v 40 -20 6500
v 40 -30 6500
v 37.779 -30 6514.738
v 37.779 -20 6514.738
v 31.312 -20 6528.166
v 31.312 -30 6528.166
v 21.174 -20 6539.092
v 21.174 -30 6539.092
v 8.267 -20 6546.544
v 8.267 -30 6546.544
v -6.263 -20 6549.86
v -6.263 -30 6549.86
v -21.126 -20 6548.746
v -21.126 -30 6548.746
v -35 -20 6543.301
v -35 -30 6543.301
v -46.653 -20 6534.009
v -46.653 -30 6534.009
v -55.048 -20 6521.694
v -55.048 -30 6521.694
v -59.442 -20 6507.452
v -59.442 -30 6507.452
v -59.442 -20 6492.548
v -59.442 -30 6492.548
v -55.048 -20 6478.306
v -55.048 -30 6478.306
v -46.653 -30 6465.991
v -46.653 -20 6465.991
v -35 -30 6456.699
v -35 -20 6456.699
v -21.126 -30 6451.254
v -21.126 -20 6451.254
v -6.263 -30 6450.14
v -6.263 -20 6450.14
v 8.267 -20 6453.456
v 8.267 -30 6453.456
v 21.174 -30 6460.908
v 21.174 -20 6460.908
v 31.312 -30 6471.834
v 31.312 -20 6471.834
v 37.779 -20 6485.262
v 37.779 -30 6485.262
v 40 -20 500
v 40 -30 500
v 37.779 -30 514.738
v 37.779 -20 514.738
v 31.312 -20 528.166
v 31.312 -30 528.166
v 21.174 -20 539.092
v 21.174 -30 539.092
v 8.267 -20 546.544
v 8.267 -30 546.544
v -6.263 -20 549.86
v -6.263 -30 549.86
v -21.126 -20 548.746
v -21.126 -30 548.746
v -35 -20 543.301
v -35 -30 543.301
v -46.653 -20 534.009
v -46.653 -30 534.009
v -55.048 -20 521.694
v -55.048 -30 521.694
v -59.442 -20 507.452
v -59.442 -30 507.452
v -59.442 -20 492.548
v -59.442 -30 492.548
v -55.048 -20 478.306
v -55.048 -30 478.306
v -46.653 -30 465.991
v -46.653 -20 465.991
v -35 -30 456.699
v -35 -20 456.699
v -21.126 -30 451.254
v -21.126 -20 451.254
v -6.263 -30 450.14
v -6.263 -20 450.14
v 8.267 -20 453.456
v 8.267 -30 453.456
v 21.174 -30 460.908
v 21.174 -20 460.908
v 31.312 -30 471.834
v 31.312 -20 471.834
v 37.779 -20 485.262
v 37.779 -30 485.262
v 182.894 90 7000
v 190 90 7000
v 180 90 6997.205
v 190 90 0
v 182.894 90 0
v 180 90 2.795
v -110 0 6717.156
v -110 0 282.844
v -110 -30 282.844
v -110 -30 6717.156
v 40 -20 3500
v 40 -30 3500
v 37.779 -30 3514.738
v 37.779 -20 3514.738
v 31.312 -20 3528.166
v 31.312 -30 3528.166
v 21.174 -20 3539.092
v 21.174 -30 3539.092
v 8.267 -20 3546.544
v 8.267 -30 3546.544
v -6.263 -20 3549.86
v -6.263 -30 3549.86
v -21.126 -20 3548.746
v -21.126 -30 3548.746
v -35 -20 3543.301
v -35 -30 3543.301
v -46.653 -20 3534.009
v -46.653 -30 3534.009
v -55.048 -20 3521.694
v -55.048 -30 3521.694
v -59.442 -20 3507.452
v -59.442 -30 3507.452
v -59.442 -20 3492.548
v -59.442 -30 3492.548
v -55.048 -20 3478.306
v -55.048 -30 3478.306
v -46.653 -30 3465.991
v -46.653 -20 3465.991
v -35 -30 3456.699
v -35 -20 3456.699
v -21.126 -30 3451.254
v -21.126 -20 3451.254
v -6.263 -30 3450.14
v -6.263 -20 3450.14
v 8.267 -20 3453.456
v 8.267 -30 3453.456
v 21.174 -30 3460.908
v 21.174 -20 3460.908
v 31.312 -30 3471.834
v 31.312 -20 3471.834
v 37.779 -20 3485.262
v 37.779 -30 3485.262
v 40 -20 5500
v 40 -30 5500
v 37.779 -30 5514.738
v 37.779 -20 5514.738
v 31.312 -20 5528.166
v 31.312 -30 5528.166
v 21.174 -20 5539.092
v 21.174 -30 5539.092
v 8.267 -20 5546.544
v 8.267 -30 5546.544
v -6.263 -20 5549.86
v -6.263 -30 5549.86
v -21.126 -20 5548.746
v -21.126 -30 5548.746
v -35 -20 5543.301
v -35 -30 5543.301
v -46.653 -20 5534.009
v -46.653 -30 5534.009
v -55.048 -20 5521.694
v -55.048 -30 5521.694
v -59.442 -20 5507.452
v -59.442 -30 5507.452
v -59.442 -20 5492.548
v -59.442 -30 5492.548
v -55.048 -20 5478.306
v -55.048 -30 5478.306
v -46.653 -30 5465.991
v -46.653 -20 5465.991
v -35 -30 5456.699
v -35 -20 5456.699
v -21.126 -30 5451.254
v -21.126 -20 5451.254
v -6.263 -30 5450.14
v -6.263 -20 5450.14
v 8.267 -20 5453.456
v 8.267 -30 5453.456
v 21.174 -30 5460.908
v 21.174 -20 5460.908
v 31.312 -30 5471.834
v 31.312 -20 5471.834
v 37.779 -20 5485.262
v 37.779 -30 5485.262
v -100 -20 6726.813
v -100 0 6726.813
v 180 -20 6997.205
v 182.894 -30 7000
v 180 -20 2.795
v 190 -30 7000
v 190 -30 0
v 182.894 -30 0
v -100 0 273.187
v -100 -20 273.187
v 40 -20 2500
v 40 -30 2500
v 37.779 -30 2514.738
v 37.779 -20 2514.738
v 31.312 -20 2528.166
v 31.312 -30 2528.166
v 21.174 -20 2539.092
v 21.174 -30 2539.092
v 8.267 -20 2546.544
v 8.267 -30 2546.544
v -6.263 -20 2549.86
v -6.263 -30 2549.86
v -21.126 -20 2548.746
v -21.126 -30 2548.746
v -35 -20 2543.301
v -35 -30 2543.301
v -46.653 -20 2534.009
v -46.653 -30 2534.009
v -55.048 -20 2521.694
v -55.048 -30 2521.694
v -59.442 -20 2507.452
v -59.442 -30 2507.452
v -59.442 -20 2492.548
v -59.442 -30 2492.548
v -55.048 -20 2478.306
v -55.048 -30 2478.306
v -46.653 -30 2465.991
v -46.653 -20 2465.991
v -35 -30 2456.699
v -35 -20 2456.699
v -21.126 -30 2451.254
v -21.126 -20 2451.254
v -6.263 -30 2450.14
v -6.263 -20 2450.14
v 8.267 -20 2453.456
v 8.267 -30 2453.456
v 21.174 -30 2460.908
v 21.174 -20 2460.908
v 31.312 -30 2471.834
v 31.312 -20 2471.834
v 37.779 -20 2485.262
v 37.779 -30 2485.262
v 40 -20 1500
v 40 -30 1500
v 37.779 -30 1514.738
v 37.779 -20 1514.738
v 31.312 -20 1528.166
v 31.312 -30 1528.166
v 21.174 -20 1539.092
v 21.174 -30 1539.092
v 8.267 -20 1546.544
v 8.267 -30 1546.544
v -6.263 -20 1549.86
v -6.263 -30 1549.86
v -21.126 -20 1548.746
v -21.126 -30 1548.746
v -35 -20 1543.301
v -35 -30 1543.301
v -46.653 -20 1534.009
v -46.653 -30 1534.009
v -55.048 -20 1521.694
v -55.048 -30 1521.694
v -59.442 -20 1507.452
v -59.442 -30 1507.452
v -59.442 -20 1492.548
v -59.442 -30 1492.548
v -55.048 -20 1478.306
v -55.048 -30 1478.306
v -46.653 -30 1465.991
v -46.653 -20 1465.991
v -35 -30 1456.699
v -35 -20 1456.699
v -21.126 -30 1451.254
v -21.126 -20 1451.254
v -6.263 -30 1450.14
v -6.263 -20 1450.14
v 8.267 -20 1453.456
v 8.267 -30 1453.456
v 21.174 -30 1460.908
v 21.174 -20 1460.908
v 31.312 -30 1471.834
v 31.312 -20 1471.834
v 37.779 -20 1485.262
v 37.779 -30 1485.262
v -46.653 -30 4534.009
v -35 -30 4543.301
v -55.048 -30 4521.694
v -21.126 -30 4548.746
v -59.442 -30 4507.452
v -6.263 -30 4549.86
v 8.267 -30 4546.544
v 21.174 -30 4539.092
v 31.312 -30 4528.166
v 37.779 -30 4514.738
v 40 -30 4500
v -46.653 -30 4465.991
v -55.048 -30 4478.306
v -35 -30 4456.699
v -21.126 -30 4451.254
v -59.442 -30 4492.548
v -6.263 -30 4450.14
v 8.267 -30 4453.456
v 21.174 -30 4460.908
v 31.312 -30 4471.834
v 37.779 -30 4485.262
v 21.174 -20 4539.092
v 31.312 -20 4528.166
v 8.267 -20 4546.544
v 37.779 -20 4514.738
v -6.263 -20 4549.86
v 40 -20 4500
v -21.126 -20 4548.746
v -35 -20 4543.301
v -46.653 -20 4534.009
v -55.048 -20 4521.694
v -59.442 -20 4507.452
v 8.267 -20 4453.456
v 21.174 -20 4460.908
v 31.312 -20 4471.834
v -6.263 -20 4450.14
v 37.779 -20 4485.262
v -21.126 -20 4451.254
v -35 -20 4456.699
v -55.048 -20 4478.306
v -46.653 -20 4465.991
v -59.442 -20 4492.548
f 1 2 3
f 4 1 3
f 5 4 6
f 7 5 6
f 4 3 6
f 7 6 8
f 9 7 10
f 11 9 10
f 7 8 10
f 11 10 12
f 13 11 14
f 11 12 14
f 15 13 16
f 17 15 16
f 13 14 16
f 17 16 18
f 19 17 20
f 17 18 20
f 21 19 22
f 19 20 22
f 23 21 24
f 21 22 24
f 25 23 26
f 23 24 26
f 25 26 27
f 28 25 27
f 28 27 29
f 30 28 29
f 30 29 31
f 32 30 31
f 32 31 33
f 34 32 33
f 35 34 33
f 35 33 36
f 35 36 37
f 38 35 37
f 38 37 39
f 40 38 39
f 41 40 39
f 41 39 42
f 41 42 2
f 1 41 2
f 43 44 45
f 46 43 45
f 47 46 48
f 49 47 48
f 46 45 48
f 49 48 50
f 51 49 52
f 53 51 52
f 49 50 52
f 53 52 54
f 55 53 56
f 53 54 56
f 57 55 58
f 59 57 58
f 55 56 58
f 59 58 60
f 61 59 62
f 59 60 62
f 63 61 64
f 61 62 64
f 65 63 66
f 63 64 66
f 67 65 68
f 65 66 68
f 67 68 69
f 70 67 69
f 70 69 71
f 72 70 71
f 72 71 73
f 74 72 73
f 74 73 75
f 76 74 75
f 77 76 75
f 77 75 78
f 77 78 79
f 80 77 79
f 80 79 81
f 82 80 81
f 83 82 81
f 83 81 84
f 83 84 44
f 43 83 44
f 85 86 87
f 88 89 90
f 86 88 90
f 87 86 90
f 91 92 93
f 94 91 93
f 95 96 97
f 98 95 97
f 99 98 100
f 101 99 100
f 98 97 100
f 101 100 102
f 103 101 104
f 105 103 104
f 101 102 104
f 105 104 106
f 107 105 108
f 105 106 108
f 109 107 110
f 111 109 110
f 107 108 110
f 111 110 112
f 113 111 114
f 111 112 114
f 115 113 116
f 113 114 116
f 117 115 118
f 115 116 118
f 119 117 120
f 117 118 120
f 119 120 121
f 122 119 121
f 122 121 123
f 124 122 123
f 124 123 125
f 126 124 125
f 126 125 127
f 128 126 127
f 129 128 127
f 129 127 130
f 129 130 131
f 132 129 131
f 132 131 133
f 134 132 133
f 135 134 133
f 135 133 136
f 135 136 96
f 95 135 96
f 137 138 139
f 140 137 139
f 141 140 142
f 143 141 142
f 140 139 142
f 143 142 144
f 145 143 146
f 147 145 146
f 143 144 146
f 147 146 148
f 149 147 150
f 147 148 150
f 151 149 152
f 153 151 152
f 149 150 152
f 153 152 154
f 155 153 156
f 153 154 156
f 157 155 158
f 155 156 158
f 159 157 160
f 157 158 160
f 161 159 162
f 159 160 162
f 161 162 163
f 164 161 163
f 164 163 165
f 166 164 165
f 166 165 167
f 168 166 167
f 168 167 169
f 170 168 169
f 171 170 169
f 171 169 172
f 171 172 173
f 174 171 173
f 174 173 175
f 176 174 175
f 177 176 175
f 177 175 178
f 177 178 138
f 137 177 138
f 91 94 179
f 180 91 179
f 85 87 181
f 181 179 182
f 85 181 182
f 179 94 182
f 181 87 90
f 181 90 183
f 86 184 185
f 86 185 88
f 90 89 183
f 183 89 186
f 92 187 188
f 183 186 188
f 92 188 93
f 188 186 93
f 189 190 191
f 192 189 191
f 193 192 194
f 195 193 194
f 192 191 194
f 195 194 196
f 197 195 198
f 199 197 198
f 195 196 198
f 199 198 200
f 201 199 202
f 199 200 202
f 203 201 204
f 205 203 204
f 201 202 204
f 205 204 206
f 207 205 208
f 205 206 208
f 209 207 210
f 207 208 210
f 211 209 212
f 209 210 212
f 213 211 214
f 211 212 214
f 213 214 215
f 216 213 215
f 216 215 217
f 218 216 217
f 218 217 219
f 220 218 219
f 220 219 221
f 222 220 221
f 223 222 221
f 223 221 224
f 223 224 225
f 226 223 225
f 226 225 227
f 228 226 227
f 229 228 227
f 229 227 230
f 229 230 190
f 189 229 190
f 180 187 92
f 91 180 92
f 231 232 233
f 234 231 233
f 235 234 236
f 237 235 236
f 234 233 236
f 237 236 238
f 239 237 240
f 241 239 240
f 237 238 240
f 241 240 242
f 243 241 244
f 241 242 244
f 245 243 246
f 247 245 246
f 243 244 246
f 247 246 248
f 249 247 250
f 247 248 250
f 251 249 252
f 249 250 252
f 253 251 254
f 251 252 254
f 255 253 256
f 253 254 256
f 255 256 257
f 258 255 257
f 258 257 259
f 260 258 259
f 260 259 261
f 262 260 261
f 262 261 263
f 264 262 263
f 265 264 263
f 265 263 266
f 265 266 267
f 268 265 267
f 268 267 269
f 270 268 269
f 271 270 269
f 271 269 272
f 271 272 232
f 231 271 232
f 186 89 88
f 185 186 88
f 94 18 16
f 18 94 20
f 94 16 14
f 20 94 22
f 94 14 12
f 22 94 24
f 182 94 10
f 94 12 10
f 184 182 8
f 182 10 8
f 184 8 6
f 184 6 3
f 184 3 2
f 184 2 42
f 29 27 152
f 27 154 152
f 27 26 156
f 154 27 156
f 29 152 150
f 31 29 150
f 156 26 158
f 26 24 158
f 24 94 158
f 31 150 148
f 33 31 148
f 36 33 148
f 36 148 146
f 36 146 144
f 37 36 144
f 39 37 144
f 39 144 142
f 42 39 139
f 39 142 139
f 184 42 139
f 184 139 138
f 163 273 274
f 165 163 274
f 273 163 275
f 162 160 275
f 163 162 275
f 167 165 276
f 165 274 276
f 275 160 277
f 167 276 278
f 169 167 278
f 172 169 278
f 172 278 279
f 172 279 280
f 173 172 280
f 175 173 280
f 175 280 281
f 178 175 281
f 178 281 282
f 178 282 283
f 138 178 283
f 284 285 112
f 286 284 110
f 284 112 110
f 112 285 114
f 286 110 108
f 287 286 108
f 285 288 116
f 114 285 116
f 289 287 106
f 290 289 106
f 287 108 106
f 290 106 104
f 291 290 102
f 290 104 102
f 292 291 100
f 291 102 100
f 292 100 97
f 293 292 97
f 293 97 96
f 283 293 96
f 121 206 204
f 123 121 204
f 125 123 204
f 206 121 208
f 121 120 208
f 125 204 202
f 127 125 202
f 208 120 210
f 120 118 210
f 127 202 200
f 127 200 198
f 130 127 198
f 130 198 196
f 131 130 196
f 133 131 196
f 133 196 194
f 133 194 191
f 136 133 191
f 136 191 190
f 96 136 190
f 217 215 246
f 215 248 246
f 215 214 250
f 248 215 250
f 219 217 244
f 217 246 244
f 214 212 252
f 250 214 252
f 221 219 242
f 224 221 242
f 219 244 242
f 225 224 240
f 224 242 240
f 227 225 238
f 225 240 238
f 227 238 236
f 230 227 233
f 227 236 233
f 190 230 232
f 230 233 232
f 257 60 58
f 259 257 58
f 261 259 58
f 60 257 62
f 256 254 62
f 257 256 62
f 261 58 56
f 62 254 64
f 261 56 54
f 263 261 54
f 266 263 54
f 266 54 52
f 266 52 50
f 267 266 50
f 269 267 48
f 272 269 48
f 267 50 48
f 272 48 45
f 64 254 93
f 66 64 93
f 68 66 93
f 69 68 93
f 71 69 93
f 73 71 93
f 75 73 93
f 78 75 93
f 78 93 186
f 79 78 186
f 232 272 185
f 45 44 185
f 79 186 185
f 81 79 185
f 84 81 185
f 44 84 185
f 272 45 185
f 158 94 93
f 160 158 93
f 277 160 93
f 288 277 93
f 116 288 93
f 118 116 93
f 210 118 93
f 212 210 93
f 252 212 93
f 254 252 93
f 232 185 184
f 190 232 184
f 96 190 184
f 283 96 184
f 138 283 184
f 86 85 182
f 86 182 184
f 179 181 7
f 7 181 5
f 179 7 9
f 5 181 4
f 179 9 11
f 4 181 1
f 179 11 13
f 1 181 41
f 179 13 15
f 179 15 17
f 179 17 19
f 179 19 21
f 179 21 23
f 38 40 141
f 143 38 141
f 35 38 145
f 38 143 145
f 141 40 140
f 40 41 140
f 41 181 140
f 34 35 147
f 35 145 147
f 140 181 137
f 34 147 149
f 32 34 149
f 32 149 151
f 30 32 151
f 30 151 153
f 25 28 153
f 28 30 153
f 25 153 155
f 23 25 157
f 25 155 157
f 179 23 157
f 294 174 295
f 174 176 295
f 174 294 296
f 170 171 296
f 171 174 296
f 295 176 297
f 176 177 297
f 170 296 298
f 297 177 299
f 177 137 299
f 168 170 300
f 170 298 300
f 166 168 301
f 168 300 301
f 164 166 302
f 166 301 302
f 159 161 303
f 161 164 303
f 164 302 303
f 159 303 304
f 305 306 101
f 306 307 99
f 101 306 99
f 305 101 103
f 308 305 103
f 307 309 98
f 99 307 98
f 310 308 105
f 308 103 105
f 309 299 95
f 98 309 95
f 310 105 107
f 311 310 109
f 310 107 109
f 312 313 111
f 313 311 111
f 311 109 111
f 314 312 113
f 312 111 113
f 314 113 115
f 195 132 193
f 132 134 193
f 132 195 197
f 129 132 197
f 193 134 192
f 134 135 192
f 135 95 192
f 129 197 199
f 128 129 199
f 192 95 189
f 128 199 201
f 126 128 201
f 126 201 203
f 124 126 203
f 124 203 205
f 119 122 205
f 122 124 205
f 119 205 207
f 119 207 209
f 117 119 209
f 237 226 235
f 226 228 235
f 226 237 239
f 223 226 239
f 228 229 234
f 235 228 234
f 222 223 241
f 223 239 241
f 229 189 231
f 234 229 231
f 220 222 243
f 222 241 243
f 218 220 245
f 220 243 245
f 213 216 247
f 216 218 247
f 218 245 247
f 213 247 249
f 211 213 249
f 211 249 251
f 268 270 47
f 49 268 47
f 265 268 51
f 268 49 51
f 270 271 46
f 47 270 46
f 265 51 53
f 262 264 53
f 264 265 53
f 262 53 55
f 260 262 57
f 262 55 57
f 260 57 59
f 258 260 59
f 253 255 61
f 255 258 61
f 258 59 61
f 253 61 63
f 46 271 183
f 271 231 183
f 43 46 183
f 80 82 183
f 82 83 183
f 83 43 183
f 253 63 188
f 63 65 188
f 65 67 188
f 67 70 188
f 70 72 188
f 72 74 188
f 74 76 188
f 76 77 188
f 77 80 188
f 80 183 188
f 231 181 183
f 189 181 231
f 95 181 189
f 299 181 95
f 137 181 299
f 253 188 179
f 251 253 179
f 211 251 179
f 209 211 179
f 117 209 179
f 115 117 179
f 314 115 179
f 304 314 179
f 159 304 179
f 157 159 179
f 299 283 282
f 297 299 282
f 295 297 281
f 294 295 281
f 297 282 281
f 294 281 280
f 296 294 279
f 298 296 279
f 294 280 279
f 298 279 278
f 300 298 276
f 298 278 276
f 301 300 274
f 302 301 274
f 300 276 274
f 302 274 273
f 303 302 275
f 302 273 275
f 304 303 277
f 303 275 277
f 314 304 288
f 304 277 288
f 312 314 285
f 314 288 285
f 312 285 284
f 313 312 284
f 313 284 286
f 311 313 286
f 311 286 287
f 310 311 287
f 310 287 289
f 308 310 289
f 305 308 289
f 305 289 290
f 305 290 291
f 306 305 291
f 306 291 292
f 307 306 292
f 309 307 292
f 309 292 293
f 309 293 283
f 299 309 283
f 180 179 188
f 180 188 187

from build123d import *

# Parameters (mm, degrees)
F1_DEPTH = 7000
F3_DEPTH = 200
F4_R     = 50
F5_DEPTH = 120.001


with BuildPart() as f1:
    # F0 (on Top) → F1 (new body)
    with BuildSketch(Plane.XY):
        Polygon((-100, 0), (-110, 0), (-110, -30), (190, -30), (190, 90), (180, 90), (180, -20), (-100, -20), align=None)
    extrude(amount=F1_DEPTH)

    # F2 (on face) → F3 (cut)
    with BuildSketch(Plane.XZ.offset(30)):
        Polygon((182.8939372419, 0), (-110, 282.8443874035), (-110, 0), align=None)
        Polygon((-110, 7000), (-110, 6717.1556125965), (182.8939372419, 7000), align=None)
    extrude(amount=-F3_DEPTH, mode=Mode.SUBTRACT)

    # F4 (on face) → F5 (cut, through all)
    with BuildSketch(Plane.XZ.offset(30)):
        with Locations((-10, 6500)):
            Circle(F4_R)
        with Locations((-10, 5500)):
            Circle(F4_R)
        with Locations((-10, 4500)):
            Circle(F4_R)
        with Locations((-10, 3500)):
            Circle(F4_R)
        with Locations((-10, 2500)):
            Circle(F4_R)
        with Locations((-10, 1500)):
            Circle(F4_R)
        with Locations((-10, 500)):
            Circle(F4_R)
    extrude(amount=-F5_DEPTH, mode=Mode.SUBTRACT)


solid = f1.part
